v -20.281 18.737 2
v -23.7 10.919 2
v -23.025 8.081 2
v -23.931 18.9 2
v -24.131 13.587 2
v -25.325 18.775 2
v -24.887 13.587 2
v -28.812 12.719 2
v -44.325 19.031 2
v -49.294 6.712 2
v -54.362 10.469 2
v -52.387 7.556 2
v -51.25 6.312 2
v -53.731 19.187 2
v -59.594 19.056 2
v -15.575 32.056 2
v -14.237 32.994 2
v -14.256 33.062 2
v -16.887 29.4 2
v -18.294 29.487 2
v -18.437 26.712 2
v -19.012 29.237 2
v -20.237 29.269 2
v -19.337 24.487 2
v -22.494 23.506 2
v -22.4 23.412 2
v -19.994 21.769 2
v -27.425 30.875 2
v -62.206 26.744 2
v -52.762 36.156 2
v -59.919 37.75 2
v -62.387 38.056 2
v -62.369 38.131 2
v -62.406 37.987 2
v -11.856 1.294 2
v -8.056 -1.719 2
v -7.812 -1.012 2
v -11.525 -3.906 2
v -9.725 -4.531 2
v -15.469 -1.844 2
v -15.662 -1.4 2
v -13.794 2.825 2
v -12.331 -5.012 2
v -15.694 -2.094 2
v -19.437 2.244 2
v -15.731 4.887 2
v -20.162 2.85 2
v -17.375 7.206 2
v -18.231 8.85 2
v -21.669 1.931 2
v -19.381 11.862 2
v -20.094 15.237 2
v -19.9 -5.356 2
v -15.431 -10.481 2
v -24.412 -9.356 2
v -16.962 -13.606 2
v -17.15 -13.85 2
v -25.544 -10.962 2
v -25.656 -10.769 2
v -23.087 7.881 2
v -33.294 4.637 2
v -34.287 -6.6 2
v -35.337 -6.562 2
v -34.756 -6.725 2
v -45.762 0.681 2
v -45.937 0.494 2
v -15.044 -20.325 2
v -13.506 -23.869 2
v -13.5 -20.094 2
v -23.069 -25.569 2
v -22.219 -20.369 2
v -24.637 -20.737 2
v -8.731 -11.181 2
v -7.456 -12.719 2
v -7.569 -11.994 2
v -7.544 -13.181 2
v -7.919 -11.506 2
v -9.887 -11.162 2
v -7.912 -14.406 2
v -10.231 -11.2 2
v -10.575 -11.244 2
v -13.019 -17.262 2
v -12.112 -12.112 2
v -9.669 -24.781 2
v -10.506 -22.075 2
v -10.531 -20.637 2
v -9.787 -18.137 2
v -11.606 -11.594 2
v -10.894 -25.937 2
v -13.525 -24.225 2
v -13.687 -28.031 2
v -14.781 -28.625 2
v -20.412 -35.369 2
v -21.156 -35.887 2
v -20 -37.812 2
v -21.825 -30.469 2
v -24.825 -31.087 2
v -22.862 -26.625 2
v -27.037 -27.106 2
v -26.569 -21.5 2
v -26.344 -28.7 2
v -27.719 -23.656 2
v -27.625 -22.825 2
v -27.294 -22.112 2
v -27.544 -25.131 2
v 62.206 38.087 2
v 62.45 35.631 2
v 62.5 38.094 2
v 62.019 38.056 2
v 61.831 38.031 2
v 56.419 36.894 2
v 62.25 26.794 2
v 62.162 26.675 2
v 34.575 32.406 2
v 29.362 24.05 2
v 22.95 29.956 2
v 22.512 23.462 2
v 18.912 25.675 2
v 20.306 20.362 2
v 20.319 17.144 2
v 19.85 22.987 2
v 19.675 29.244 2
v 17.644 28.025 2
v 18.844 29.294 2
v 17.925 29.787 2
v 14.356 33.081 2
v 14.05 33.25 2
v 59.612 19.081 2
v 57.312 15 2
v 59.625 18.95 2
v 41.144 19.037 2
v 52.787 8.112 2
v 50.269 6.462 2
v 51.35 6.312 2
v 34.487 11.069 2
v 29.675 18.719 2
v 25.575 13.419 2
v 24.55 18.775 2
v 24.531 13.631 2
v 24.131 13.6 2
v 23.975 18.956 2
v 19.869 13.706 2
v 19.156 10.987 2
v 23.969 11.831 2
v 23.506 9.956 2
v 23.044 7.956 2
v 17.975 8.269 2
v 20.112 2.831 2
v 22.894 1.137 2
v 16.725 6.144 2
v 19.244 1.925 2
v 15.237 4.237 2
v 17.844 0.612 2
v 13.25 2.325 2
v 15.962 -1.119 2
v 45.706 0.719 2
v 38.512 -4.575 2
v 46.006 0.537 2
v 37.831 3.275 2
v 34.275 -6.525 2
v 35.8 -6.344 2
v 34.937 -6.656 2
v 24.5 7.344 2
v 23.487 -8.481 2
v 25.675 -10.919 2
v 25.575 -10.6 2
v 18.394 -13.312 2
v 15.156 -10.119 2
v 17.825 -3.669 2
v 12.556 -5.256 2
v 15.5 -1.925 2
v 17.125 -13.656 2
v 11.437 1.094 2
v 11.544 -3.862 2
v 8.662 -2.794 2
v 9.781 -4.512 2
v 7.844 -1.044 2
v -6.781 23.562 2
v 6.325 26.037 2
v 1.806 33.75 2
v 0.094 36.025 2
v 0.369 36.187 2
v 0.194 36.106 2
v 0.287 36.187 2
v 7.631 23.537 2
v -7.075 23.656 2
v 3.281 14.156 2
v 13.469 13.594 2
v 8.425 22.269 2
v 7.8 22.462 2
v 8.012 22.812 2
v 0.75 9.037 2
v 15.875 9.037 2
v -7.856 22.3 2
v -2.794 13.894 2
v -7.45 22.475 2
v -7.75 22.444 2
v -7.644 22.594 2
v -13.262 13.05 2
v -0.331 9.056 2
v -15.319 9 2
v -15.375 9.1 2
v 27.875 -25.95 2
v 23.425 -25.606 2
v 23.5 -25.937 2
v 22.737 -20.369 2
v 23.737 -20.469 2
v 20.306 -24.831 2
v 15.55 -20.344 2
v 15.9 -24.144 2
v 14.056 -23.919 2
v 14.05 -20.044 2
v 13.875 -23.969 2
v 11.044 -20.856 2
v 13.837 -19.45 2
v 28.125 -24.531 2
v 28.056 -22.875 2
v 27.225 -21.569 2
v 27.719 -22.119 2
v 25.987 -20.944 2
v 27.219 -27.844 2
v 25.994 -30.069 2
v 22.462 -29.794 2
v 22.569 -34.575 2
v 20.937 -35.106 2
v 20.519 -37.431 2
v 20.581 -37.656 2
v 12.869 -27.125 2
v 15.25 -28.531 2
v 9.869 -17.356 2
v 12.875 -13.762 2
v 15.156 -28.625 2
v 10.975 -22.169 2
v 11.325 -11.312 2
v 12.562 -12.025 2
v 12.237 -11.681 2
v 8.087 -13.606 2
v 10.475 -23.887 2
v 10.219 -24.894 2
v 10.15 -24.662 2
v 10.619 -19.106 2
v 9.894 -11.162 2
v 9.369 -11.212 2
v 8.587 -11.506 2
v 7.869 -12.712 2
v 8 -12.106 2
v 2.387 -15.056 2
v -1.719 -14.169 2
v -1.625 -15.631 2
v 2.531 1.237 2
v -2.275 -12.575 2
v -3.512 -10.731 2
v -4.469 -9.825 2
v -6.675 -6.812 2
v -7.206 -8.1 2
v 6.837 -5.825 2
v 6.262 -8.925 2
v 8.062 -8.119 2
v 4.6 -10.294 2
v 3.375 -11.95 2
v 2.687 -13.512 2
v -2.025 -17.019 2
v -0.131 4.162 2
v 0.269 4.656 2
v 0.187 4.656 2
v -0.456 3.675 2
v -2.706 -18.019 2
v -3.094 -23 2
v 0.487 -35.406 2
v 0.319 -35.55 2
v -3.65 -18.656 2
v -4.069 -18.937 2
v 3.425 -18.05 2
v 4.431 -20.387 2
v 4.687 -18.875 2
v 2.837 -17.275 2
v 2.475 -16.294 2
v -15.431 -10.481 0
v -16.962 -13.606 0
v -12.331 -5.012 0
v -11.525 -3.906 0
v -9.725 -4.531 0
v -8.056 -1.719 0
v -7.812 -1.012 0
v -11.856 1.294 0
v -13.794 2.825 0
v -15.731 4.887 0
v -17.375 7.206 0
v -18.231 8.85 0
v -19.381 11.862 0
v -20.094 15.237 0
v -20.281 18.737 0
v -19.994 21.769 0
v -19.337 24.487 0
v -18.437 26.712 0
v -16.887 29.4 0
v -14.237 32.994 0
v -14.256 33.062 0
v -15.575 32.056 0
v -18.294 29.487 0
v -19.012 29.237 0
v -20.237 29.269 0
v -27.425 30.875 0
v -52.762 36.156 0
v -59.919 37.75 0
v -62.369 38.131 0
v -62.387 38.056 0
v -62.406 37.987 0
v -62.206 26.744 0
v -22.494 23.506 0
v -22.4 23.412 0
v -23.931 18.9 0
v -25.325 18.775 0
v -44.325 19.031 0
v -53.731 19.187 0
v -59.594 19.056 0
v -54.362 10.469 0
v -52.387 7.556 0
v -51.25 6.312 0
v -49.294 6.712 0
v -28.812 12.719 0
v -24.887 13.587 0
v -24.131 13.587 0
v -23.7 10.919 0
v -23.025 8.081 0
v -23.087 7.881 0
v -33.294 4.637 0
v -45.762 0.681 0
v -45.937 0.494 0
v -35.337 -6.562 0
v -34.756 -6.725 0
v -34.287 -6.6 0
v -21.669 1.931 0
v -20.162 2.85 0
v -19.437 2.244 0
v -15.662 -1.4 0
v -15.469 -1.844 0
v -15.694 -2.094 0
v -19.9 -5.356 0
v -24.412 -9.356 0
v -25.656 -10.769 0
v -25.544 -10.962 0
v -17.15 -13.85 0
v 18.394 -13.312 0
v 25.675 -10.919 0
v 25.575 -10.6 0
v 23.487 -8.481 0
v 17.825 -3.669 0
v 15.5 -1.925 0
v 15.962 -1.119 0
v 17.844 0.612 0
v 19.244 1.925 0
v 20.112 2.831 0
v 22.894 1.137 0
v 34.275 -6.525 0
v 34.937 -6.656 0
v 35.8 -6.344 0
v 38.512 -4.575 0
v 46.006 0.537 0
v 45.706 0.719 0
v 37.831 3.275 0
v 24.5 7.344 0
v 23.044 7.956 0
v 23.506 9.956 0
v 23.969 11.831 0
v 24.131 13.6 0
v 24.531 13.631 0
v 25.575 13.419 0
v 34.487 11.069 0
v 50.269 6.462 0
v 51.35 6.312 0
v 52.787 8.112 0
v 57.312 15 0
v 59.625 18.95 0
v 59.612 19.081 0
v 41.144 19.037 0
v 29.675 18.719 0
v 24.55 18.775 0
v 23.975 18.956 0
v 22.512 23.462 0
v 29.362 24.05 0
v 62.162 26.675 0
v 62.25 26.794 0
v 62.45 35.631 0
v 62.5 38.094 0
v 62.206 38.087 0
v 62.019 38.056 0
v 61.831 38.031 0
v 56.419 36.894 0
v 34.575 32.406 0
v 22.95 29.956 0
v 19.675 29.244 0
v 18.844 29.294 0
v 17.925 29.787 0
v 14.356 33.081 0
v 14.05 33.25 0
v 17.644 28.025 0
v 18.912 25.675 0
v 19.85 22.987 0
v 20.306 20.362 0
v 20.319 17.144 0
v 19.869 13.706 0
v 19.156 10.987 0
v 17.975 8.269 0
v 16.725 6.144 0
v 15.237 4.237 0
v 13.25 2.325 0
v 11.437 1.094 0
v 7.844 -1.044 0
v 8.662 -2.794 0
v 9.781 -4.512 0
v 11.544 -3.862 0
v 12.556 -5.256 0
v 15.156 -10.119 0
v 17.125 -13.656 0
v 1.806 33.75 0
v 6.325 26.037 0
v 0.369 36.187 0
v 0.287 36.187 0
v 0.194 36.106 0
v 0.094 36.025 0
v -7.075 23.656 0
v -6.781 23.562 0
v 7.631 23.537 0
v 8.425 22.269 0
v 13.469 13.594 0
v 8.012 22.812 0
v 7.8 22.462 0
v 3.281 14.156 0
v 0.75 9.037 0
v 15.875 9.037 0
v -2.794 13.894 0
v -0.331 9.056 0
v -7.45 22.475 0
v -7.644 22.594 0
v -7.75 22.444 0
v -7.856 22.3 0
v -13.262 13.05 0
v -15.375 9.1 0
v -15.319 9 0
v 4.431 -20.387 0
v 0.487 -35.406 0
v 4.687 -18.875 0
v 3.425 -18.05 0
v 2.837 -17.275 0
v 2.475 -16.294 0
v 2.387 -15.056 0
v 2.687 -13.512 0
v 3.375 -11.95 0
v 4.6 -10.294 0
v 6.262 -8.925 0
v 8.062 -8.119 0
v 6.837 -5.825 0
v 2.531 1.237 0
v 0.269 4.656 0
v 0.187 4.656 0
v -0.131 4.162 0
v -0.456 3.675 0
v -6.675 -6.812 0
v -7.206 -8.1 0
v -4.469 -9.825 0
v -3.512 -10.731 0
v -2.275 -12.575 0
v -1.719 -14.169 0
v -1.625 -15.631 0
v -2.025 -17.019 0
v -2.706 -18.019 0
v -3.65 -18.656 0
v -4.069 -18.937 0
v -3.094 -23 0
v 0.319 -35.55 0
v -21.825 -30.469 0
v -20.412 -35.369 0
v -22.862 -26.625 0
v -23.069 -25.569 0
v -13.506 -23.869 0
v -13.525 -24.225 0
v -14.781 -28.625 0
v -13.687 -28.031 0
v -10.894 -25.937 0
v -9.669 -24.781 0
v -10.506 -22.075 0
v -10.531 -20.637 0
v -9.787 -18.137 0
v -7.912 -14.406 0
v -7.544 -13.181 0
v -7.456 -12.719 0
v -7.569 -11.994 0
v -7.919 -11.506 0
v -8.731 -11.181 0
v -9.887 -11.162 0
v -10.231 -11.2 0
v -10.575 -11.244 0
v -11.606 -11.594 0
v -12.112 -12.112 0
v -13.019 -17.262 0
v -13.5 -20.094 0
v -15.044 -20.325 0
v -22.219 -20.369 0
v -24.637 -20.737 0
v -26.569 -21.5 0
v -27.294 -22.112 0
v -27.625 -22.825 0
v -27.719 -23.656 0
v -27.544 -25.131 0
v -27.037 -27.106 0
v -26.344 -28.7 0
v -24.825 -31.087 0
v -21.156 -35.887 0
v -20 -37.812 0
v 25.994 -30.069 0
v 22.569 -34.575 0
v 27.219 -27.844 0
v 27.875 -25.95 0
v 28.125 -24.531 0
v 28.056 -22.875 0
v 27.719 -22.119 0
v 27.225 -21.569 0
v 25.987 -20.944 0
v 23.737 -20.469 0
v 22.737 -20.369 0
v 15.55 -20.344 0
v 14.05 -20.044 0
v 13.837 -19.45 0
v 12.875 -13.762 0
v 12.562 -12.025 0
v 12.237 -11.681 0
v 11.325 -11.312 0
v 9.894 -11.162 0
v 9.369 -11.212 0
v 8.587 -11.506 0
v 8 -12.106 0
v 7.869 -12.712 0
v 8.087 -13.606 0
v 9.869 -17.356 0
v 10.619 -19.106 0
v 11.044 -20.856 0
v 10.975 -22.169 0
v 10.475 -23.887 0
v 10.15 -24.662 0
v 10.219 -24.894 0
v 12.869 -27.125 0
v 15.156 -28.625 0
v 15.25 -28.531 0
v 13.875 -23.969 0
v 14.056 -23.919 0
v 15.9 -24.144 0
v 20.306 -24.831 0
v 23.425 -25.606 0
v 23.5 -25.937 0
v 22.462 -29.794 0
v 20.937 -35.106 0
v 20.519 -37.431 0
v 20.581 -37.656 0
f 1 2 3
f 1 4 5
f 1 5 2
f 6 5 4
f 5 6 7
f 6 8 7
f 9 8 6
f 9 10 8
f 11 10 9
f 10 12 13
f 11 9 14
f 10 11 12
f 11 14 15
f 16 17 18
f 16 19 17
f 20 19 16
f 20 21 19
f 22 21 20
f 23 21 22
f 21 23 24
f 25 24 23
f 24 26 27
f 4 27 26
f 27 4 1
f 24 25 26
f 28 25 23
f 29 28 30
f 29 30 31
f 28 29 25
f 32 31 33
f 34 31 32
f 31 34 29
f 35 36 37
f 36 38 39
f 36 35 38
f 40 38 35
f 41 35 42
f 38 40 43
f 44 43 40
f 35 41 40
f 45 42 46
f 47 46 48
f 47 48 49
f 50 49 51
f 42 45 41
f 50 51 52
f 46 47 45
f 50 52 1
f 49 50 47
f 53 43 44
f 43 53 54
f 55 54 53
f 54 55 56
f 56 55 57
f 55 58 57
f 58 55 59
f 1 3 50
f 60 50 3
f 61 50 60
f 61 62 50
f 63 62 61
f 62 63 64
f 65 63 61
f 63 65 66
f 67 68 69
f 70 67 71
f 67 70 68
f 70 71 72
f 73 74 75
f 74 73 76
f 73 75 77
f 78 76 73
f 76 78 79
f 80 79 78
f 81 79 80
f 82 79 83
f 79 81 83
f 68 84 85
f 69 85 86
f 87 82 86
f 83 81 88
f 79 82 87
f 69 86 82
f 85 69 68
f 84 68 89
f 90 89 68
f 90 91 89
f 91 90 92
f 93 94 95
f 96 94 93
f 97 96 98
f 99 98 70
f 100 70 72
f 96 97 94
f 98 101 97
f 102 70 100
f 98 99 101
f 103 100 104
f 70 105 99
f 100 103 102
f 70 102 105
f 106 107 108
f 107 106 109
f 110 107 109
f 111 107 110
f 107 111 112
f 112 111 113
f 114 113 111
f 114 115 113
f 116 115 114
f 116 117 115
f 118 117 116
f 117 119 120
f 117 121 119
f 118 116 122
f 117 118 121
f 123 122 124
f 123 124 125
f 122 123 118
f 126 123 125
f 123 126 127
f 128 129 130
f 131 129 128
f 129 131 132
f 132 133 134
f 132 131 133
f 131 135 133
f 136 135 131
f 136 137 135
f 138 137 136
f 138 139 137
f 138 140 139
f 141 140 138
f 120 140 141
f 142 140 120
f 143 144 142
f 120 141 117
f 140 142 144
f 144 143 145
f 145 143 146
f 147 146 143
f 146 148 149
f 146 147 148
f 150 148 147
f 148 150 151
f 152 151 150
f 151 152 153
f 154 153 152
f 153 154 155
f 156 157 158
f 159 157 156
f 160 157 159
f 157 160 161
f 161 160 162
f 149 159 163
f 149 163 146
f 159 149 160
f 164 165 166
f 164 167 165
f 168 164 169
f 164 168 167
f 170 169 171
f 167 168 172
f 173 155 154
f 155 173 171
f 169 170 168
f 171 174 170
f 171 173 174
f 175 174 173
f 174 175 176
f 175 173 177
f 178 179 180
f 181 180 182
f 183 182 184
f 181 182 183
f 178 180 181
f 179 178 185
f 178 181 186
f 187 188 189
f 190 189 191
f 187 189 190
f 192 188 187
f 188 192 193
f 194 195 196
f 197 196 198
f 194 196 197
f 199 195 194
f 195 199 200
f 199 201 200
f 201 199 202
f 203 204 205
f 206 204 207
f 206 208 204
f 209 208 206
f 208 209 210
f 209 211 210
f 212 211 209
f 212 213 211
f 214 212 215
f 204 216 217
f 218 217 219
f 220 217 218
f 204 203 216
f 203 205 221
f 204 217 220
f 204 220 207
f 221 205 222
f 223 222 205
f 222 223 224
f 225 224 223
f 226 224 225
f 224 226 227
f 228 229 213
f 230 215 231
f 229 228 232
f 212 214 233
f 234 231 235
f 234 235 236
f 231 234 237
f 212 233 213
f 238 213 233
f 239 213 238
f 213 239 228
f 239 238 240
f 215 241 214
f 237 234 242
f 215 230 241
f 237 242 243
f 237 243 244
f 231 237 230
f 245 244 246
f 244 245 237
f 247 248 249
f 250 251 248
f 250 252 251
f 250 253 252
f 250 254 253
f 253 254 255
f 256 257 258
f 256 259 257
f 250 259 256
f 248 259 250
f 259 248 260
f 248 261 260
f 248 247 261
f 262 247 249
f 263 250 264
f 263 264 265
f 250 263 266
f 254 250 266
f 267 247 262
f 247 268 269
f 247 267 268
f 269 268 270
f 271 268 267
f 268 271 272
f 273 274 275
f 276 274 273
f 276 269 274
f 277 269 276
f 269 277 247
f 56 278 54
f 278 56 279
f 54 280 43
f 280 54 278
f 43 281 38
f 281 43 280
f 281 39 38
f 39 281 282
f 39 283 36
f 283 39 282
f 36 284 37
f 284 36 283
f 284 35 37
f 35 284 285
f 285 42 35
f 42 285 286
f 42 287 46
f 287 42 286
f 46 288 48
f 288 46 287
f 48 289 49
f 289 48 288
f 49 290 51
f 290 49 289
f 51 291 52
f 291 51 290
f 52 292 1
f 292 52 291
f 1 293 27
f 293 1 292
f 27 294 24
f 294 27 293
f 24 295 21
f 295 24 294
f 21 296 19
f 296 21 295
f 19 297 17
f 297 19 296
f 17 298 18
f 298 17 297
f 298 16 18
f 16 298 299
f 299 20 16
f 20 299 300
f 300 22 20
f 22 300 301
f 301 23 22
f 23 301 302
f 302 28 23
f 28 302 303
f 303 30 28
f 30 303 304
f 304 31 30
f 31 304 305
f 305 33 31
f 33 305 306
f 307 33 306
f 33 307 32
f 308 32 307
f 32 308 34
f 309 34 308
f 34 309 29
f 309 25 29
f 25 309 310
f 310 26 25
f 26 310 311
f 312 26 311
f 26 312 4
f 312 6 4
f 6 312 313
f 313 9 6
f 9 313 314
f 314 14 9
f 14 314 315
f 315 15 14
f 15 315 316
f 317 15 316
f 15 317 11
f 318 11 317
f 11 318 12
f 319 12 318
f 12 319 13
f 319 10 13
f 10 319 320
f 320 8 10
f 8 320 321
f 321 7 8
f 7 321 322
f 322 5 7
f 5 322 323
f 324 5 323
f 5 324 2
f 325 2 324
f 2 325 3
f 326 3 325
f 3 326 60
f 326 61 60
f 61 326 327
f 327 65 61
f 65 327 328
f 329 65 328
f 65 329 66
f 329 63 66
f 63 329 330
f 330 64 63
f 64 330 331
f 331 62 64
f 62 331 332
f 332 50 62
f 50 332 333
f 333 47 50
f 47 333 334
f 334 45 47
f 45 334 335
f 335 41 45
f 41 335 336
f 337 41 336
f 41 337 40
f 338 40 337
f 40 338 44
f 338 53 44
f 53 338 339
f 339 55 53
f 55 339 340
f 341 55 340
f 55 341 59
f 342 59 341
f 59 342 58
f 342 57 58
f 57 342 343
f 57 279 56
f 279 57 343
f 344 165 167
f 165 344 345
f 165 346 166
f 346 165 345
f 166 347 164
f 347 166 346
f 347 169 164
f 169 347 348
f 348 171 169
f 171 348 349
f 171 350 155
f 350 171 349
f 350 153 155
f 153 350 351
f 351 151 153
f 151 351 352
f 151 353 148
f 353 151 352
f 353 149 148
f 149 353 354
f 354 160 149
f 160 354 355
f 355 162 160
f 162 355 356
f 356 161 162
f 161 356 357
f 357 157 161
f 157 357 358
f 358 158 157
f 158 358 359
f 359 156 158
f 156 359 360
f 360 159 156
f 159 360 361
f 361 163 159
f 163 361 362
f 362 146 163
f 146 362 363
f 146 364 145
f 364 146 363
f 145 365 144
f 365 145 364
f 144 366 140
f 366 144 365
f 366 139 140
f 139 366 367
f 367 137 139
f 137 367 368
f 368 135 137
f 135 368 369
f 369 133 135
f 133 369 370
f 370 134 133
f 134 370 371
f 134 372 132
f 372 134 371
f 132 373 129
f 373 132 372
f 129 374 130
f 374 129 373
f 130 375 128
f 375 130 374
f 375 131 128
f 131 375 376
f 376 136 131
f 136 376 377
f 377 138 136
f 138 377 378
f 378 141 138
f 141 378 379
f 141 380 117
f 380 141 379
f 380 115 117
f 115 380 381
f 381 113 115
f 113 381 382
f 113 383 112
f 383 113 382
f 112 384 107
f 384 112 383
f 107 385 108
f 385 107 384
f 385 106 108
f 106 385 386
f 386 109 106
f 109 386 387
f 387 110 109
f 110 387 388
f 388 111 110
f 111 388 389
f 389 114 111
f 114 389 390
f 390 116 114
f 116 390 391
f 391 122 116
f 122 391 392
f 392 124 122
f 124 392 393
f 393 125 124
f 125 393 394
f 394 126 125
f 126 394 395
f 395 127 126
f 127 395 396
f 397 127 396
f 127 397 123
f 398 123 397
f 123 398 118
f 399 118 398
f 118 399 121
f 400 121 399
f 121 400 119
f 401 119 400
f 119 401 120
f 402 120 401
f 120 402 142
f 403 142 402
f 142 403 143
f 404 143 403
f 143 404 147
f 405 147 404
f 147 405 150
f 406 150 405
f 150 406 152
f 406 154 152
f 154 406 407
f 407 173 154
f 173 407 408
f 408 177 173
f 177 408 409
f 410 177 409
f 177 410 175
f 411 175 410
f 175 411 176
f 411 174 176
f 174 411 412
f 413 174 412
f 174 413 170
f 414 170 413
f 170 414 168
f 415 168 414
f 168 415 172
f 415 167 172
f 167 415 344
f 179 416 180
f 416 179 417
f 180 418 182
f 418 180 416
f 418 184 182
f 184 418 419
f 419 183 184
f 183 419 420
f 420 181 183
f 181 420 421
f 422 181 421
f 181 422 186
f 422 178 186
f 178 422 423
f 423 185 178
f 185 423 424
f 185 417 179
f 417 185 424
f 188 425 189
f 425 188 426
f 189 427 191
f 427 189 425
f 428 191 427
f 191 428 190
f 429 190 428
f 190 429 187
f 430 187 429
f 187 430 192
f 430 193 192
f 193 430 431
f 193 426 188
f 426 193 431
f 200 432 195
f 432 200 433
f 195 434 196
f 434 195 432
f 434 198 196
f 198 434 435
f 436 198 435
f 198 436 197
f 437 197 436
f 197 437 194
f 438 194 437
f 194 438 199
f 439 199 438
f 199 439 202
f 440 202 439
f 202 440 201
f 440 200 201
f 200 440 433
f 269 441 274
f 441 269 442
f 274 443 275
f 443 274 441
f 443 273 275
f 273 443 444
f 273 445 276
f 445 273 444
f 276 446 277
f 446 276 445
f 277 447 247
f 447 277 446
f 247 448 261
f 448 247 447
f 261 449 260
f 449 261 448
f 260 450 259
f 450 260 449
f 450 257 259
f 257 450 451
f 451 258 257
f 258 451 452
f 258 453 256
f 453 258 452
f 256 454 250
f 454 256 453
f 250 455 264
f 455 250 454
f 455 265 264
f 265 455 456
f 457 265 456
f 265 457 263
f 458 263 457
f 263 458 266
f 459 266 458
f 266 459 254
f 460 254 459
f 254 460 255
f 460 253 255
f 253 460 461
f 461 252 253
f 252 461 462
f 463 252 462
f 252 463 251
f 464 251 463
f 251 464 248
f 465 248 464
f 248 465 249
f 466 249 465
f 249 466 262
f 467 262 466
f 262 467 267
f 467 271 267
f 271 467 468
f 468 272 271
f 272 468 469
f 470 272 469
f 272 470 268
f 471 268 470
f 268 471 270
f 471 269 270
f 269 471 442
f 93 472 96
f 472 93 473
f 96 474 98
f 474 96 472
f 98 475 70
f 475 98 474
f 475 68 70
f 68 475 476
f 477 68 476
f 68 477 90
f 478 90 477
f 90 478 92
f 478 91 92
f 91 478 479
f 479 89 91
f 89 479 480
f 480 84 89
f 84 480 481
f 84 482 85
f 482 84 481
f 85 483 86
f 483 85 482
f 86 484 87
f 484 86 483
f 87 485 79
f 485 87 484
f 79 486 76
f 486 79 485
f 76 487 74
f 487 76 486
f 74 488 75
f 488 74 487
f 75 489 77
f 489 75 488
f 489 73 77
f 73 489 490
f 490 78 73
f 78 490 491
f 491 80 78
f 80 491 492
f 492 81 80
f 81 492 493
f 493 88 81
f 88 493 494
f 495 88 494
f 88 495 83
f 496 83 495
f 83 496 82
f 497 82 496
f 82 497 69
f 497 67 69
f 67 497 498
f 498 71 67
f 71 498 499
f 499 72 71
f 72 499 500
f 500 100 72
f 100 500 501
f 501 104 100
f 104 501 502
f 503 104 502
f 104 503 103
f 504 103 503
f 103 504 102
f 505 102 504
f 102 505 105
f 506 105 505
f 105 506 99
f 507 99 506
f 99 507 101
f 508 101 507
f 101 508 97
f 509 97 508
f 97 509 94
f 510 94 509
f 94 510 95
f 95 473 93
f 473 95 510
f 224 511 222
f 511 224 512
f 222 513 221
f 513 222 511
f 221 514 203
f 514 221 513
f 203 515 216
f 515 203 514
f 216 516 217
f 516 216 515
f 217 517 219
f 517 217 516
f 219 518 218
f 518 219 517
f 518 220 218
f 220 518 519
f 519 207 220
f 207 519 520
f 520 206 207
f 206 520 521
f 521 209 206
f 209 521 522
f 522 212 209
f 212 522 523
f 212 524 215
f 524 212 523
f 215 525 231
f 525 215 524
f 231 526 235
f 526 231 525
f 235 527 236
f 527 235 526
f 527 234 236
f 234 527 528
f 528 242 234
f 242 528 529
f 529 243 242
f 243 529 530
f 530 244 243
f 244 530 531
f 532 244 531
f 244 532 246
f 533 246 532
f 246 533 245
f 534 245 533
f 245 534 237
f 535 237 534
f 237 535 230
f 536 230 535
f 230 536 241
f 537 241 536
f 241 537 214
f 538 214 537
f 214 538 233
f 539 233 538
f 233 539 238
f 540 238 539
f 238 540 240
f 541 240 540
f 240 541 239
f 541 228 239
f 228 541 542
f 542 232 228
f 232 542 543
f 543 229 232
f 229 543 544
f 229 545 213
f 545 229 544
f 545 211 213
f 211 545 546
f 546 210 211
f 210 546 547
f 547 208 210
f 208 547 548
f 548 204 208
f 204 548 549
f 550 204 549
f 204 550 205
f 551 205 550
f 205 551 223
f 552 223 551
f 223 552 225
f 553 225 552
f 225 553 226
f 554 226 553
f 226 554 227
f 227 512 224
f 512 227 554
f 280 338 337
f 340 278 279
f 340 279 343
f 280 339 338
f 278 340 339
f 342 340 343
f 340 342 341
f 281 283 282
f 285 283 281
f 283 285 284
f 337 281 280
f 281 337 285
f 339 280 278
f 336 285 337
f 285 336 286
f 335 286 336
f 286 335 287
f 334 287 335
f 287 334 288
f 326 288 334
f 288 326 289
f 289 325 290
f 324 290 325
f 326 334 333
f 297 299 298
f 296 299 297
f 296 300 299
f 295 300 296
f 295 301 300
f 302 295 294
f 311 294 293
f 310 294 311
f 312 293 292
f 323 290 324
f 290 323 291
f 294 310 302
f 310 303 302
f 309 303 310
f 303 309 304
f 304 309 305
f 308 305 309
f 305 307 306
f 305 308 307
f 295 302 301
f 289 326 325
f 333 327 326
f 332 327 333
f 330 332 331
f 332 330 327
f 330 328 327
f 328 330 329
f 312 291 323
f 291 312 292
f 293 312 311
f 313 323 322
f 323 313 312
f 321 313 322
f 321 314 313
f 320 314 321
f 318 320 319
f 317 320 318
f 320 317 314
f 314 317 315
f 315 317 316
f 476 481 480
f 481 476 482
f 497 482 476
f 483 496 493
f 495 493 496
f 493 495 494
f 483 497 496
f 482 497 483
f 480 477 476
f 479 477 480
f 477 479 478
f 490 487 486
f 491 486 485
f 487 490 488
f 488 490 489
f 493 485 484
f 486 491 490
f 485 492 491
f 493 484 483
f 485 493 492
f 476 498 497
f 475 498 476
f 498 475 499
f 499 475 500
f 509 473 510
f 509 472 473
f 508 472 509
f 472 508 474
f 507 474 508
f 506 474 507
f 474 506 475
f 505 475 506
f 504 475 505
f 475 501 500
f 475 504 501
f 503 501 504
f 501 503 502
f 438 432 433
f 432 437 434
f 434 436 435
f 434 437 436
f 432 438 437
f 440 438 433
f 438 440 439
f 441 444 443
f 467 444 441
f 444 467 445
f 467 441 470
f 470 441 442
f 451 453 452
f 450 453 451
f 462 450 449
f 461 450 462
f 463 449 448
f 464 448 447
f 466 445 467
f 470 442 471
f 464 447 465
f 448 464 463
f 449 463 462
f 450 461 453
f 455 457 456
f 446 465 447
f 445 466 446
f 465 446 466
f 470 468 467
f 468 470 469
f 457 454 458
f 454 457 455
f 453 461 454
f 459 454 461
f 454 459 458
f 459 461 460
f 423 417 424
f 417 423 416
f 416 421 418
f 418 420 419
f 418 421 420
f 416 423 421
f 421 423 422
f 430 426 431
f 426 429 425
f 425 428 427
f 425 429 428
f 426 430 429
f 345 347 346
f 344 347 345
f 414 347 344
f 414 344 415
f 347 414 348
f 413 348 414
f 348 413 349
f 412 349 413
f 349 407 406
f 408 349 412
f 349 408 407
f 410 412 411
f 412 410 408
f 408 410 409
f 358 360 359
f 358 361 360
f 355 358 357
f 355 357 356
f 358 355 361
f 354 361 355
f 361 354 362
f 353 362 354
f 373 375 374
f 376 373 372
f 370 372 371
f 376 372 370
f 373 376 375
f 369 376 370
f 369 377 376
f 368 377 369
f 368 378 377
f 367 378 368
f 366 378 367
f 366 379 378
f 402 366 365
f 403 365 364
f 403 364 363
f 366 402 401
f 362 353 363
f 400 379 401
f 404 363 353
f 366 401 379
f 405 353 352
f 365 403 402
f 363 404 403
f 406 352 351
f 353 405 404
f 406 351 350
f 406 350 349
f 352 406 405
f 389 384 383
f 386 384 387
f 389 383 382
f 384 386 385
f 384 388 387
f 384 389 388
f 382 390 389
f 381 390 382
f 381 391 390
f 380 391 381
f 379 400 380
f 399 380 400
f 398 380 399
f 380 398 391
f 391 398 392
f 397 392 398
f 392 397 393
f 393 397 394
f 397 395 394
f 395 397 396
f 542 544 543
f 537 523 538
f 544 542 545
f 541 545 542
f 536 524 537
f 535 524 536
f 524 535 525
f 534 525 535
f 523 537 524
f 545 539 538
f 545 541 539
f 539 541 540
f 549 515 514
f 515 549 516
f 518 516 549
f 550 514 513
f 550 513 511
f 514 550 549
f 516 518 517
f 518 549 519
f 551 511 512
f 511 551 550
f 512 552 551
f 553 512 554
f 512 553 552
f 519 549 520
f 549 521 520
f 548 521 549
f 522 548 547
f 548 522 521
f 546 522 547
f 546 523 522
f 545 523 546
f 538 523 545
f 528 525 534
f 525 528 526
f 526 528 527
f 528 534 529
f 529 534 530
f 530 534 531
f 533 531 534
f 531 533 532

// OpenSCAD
module 1791fc464e9abf3c4b17178733cf47ae_1()
{
 /* Generated by trace2scad version 20150415
    http://aggregate.org/MAKE/TRACE2SCAD/
    Optimized model has 279/3844 original points
 */
 color([0.48, 0.48, 0.48])
 assign(minx=0) /* polygon minx=15 */
 assign(miny=0) /* polygon miny=75 */
 assign(maxx=20000) /* polygon maxx=20000 */
 assign(maxy=12250) /* polygon maxy=12226 */
 assign(dx=maxx-minx)
 assign(dy=maxy-miny)
 assign(maxd=((dx>dy)?dx:dy))
 scale([1/maxd, 1/maxd, 1])
 translate([-minx-dx/2, -miny-dy/2, 0])
 linear_extrude(height=1, convexity=279)
 union() {
  union() {
   polygon([[18,12214],[15,12203],[47,10404],[6401,9886],[6416,9871],[6171,9149],[5948,9129],[2908,9170],[1403,9195],[465,9174],[1302,7800],[1618,7334],[1800,7135],[2113,7199],[5390,8160],[6018,8299],[6139,8299],[6208,7872],[6316,7418],[6306,7386],[4673,6867],[2678,6234],[2650,6204],[4346,5075],[4439,5049],[4514,5069],[6533,6434],[6774,6581],[6890,6484],[7494,5901],[7525,5830],[7489,5790],[6816,5268],[6094,4628],[5895,4402],[5913,4371],[7256,3909],[7286,3948],[7531,4448],[8027,5323],[8156,5500],[8444,5400],[8711,5850],[8750,5963],[8103,6332],[7793,6577],[7483,6907],[7220,7278],[7083,7541],[6899,8023],[6785,8563],[6755,9123],[6801,9608],[6906,10043],[7050,10399],[7298,10829],[7722,11404],[7719,11415],[7508,11254],[7073,10843],[6958,10803],[6762,10808],[5612,11065],[1558,11910],[413,12165],[21,12226]], convexity=24);
   polygon([[19923,12214],[19893,12210],[19027,12028],[15532,11310],[13672,10918],[13148,10804],[13015,10812],[12868,10891],[12297,11418],[12248,11445],[12823,10609],[13026,10233],[13176,9803],[13249,9383],[13251,8868],[13179,8318],[13065,7883],[12876,7448],[12676,7108],[12438,6803],[12120,6497],[11830,6300],[11255,5958],[11386,5678],[11565,5403],[11847,5507],[12009,5284],[12425,4506],[12740,3940],[12943,3995],[14108,4378],[14092,4429],[13758,4768],[12852,5538],[12480,5817],[12554,5946],[12855,6223],[13079,6433],[13218,6578],[13663,6307],[15484,5081],[15590,5060],[15728,5110],[16162,5393],[17361,6211],[17313,6240],[16053,6649],[13920,7300],[13687,7398],[13761,7718],[13835,8018],[13861,8301],[13925,8306],[14092,8272],[15518,7896],[18043,7159],[18216,7135],[18446,7423],[19170,8525],[19540,9157],[19538,9178],[16583,9171],[14748,9120],[13928,9129],[13836,9158],[13602,9879],[14698,9973],[19946,10393],[19960,10412],[19992,11826],[20000,12220],[19953,12219]], convexity=23);
   polygon([[10031,11902],[10015,11889],[8868,9910],[8915,9895],[11221,9891],[11012,10291],[10289,11525],[10059,11915],[10046,11915]], convexity=5);
   polygon([[11265,9747],[11248,9719],[10525,8390],[10120,7571],[12540,7571],[12155,8300],[11348,9688],[11282,9775]], convexity=5);
   polygon([[8760,9716],[8743,9693],[7878,8213],[7540,7581],[7549,7565],[9947,7574],[9553,8348],[8808,9721],[8777,9740]], convexity=6);
   polygon([[9979,6791],[9927,6713],[8932,5035],[8847,4829],[9285,4553],[9438,4408],[9636,4113],[9725,3858],[9740,3624],[9676,3402],[9567,3242],[9416,3140],[9349,3095],[9505,2445],[10051,437],[10078,460],[10709,2863],[10750,3105],[10548,3237],[10454,3361],[10396,3518],[10382,3716],[10430,3963],[10540,4213],[10736,4478],[11002,4697],[11290,4826],[11094,5193],[10405,6323],[10043,6870],[10030,6870]], convexity=10);
   polygon([[8363,4333],[8308,4326],[8143,4270],[8062,4187],[7917,3363],[7840,2910],[7593,2873],[6445,2866],[6058,2807],[5749,2685],[5633,2587],[5580,2473],[5565,2340],[5593,2104],[5674,1788],[5785,1533],[6028,1151],[6615,383],[6800,75],[6734,466],[6508,1250],[6342,1865],[6309,2034],[7839,2306],[7836,2249],[7635,1545],[7810,1640],[8257,1975],[8453,2160],[8319,2593],[8315,2823],[8434,3223],[8734,3820],[8793,4016],[8807,4090],[8789,4206],[8733,4284],[8603,4336],[8418,4339]], convexity=11);
   polygon([[11541,4335],[11499,4331],[11374,4284],[11280,4188],[11259,4091],[11294,3948],[11579,3348],[11699,3068],[11767,2788],[11756,2578],[11676,2303],[11624,2179],[11635,2142],[12059,1785],[12425,1545],[12440,1560],[12220,2290],[12249,2298],[12544,2262],[13249,2152],[13748,2028],[13760,1975],[13594,1358],[13350,508],[13283,136],[13293,100],[13611,593],[14159,1314],[14355,1670],[14460,1973],[14500,2200],[14489,2465],[14435,2586],[14356,2674],[14158,2774],[13798,2850],[13638,2866],[12488,2870],[12248,2918],[12214,3013],[12060,3923],[12010,4201],[11958,4256],[11812,4315],[11583,4339]], convexity=14);
  }
 }
}

module 1791fc464e9abf3c4b17178733cf47ae()
{
 /* all layers combined, scaled to within a 1mm cube */
 scale([1, 1, 1/1])
 difference() {
  union() {
   scale([1,1,2]) translate([0,0,-0.5]) 1791fc464e9abf3c4b17178733cf47ae_1();
  }
  translate([0,0,-2]) cube([2,2,4],center=true);
 }
}

scale([125, 125, 2]) {
	1791fc464e9abf3c4b17178733cf47ae();
}
